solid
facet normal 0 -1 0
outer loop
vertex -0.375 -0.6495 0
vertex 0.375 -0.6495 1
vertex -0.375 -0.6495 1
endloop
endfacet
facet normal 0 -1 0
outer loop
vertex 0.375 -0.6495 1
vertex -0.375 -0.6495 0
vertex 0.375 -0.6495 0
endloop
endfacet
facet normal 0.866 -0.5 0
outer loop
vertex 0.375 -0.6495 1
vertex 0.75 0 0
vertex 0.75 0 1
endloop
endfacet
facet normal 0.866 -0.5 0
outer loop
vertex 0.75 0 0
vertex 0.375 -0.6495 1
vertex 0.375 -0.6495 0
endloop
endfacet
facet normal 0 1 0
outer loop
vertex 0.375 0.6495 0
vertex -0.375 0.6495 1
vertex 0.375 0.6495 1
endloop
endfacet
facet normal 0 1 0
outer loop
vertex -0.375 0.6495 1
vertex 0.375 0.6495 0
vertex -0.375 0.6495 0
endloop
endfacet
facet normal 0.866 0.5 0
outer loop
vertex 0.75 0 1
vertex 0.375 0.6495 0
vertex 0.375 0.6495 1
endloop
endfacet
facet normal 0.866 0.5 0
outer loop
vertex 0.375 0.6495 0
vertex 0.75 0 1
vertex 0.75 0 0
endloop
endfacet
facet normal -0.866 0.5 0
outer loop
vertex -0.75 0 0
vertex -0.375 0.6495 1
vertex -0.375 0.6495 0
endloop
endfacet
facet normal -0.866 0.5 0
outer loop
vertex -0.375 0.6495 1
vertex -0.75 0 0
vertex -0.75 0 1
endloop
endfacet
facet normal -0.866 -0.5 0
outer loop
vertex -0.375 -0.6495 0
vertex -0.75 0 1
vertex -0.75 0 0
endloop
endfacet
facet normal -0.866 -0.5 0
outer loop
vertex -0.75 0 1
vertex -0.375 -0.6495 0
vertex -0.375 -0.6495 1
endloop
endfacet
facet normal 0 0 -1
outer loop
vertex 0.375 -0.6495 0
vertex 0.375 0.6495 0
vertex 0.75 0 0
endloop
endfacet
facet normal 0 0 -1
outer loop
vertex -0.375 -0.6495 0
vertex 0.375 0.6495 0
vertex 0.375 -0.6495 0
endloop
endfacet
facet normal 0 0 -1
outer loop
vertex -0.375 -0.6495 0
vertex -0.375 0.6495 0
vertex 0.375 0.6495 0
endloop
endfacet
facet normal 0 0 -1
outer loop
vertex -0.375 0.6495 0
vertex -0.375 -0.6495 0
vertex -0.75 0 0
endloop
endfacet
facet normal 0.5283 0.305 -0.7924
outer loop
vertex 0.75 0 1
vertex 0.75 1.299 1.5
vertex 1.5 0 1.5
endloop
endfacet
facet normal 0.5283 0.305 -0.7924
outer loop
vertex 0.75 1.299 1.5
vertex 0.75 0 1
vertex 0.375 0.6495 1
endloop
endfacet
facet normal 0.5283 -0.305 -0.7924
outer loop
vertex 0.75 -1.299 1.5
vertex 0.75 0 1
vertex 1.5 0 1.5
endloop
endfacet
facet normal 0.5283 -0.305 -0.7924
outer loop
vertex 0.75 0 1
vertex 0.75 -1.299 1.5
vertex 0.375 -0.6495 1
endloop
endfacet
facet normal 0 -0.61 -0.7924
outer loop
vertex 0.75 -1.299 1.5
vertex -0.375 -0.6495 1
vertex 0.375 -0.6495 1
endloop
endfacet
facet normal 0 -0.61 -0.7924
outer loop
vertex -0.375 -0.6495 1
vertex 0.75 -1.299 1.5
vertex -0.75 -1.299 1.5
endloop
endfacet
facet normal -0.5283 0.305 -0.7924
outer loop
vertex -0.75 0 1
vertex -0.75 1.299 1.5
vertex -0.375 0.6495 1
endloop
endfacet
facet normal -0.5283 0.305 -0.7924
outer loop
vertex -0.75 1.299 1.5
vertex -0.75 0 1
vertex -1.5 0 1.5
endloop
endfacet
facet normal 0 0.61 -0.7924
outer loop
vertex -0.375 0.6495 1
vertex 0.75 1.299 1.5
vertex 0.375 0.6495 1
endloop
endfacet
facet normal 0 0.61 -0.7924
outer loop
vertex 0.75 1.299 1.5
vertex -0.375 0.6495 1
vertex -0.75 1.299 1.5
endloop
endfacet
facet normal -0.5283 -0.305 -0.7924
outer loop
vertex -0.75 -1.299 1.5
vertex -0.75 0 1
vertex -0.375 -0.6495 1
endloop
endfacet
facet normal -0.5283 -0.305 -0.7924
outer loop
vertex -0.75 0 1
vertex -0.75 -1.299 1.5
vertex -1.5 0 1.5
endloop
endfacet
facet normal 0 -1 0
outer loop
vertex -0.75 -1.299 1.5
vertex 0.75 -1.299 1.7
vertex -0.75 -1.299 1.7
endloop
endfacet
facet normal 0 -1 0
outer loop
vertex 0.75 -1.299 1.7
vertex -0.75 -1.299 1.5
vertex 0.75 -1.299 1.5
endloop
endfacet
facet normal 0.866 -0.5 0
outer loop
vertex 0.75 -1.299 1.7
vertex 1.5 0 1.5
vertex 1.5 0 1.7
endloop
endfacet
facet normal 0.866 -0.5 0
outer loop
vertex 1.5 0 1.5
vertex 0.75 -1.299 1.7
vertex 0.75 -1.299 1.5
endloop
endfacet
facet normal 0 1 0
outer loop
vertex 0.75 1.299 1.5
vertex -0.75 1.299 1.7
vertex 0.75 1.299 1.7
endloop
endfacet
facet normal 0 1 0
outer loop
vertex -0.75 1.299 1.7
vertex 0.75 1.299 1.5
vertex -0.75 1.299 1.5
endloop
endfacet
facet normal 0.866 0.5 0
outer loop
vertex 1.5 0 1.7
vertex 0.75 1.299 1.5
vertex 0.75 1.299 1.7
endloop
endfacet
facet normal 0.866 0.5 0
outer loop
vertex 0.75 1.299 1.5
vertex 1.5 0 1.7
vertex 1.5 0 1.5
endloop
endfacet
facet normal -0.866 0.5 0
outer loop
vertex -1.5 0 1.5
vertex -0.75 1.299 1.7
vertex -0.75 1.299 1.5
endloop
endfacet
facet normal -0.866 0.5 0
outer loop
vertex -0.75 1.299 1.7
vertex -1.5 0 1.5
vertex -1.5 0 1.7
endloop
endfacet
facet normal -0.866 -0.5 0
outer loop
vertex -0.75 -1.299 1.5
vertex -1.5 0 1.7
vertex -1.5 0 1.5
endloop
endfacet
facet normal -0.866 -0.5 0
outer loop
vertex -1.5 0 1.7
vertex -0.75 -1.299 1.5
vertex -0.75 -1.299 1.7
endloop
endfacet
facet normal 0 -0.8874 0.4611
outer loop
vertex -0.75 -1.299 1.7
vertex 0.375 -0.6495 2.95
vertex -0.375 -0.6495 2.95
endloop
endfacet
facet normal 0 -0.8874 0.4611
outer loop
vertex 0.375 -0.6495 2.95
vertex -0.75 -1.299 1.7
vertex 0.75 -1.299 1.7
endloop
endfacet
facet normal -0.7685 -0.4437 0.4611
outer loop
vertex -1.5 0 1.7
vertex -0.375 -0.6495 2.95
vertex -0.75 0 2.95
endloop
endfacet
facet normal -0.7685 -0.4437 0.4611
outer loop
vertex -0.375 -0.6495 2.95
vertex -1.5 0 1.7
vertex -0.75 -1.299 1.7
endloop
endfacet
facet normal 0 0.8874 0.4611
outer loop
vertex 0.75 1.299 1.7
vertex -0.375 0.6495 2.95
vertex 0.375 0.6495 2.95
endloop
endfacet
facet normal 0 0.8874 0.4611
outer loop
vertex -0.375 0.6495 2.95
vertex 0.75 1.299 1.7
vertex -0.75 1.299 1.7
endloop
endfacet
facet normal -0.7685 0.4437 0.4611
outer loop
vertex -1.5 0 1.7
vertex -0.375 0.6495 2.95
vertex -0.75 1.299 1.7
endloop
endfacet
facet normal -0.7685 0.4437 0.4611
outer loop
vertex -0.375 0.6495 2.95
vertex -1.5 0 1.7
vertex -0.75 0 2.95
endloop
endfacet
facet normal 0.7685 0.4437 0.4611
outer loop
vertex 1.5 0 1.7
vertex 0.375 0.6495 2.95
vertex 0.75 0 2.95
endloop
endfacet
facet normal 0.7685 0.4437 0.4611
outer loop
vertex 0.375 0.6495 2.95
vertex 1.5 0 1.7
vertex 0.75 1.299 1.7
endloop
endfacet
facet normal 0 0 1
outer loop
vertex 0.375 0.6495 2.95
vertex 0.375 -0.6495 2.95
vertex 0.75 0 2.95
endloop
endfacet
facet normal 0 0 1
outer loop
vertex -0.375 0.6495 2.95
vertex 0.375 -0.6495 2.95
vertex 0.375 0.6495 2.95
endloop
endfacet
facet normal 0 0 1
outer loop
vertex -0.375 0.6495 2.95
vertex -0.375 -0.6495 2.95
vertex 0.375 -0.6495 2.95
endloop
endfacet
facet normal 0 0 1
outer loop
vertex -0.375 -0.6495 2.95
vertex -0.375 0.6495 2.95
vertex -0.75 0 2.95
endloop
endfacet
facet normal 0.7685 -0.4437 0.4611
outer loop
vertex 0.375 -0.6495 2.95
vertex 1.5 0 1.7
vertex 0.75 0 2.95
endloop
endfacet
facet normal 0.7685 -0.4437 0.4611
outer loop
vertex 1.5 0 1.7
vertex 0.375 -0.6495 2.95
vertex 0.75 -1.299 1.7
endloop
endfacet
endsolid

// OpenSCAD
// Example usage of customCylinder.scad
//customCylinder(r1 = 10, r2 = 20, height = 25, $fn=6);
//customCylinder(r1 = 10, r2 = 20, hypotenuse = 30, $fn=6);
//customCylinder(r1 = 10, angle = 90, height = 20, $fn=6);

// params

//stemHeight = 0.75;
//stemRadius= 0.75;
//capRadius = 1.5;
//capScale = 3/4;
//annulusHeight = 0.40;
//baseHeight = 0.75;
//baseRadius = stemRadius*3;
//z_fite = 0.05;
//flatCapRatio=0;
//
////lock array params
//n=3;
//m=3;
//capMulti=4/3;

stem_radius = 0.75;
stem_height = 1.00; //later will be auto calc with tol from head

cap_radius1 = 1.5;
cap_height_1 = 0.5;
cap_height_1_1 = 0.2;

cap_radius2 = 0.75;
cap_height_1_2 = 1.25;
echo("stem");
translate([0,0,0]) customCylinder(r1 = stem_radius, r2 = stem_radius, height = stem_height, $fn=6);
echo("stem-1");
translate([0,0,stem_height]) customCylinder(r1 = stem_radius, r2 = cap_radius1, height = cap_height_1, $fn=6);
echo("1-1");
translate([0,0,stem_height+cap_height_1]) customCylinder(r1 = cap_radius1, r2 = cap_radius1, height = cap_height_1_1, $fn=6);
echo("1-2");
translate([0,0,stem_height+cap_height_1+cap_height_1_1]) customCylinder(r1 = cap_radius1, r2 = cap_radius2, height = cap_height_1_2, $fn=6);

// --------------------------------------------------------------------
// customCylinder allows for the definition of the hypotenuse and angle
// --------------------------------------------------------------------
// Function to calculate height from hypotenuse, r1, and r2
function calculateHeightFromHypotenuse(r1, r2, hypotenuse) = sqrt(hypotenuse^2 - (r2 - r1)^2);

// Function to calculate height from r1, r2, and angle
function calculateHeightFromAngle(r1, r2, angle) = 
    let(norm_angle = angle % 180)
    norm_angle < 90
        ? (r2 - r1) / tan(abs(90 - norm_angle))
        : (r1 - r2) / tan(norm_angle);

// Function to calculate r2 from angle, r1, and height
function calculateR2FromAngle(angle, r1, height) = 
    let(norm_angle = angle % 90)
    angle < 90
        ? r1 + (tan(abs(90 - norm_angle)) * height)  // Increase r2 for angles less than 90
        : r1 - (tan(norm_angle) * height);  // Decrease r2 for angles between 90 and 180

// Function to calculate angle from r1, r2, and height
function calculateAngleFromDimensions(r1, r2, height) =
    r2 > r1
        ? 90 - atan(abs(r2 - r1) / height)
        : 90 + atan(abs(r1 - r2) / height);

// Custom cylinder function
module customCylinder(r1, r2 = undef, height = undef, hypotenuse = undef, angle = undef, $fn=$fn) {
    local_angle = angle;
  
    if (hypotenuse != undef && r2 != undef && height == undef) {
        // Height is calculated from hypotenuse
        local_height = calculateHeightFromHypotenuse(r1, r2, hypotenuse);
        local_angle = local_angle != undef ? local_angle : calculateAngleFromDimensions(r1, r2, local_height);
        echo("Final parameters: height = ", local_height, ", r1 = ", r1, ", r2 = ", r2, ", angle = ", local_angle);
        cylinder(h = local_height, r1 = r1, r2 = r2, $fn=$fn);
    } 
    else if (angle != undef && height != undef && r2 == undef) {
        // r2 is calculated from angle
        local_r2 = calculateR2FromAngle(angle, r1, height);
        echo("Final parameters: height = ", height, ", r1 = ", r1, ", r2 = ", local_r2, ", angle = ", angle);
        cylinder(h = height, r1 = r1, r2 = local_r2, $fn=$fn);
    }
    else if (height != undef && r1 != undef && r2 != undef) {
        // All parameters are defined, create the cylinder
        local_angle = local_angle != undef ? local_angle : calculateAngleFromDimensions(r1, r2, height);
        echo("Final parameters: height = ", height, ", r1 = ", r1, ", r2 = ", r2, ", angle = ", local_angle);
        cylinder(h = height, r1 = r1, r2 = r2, $fn=$fn);
    }
    else {
        echo("Error: Insufficient parameters to define the cylinder.");
    }
}
